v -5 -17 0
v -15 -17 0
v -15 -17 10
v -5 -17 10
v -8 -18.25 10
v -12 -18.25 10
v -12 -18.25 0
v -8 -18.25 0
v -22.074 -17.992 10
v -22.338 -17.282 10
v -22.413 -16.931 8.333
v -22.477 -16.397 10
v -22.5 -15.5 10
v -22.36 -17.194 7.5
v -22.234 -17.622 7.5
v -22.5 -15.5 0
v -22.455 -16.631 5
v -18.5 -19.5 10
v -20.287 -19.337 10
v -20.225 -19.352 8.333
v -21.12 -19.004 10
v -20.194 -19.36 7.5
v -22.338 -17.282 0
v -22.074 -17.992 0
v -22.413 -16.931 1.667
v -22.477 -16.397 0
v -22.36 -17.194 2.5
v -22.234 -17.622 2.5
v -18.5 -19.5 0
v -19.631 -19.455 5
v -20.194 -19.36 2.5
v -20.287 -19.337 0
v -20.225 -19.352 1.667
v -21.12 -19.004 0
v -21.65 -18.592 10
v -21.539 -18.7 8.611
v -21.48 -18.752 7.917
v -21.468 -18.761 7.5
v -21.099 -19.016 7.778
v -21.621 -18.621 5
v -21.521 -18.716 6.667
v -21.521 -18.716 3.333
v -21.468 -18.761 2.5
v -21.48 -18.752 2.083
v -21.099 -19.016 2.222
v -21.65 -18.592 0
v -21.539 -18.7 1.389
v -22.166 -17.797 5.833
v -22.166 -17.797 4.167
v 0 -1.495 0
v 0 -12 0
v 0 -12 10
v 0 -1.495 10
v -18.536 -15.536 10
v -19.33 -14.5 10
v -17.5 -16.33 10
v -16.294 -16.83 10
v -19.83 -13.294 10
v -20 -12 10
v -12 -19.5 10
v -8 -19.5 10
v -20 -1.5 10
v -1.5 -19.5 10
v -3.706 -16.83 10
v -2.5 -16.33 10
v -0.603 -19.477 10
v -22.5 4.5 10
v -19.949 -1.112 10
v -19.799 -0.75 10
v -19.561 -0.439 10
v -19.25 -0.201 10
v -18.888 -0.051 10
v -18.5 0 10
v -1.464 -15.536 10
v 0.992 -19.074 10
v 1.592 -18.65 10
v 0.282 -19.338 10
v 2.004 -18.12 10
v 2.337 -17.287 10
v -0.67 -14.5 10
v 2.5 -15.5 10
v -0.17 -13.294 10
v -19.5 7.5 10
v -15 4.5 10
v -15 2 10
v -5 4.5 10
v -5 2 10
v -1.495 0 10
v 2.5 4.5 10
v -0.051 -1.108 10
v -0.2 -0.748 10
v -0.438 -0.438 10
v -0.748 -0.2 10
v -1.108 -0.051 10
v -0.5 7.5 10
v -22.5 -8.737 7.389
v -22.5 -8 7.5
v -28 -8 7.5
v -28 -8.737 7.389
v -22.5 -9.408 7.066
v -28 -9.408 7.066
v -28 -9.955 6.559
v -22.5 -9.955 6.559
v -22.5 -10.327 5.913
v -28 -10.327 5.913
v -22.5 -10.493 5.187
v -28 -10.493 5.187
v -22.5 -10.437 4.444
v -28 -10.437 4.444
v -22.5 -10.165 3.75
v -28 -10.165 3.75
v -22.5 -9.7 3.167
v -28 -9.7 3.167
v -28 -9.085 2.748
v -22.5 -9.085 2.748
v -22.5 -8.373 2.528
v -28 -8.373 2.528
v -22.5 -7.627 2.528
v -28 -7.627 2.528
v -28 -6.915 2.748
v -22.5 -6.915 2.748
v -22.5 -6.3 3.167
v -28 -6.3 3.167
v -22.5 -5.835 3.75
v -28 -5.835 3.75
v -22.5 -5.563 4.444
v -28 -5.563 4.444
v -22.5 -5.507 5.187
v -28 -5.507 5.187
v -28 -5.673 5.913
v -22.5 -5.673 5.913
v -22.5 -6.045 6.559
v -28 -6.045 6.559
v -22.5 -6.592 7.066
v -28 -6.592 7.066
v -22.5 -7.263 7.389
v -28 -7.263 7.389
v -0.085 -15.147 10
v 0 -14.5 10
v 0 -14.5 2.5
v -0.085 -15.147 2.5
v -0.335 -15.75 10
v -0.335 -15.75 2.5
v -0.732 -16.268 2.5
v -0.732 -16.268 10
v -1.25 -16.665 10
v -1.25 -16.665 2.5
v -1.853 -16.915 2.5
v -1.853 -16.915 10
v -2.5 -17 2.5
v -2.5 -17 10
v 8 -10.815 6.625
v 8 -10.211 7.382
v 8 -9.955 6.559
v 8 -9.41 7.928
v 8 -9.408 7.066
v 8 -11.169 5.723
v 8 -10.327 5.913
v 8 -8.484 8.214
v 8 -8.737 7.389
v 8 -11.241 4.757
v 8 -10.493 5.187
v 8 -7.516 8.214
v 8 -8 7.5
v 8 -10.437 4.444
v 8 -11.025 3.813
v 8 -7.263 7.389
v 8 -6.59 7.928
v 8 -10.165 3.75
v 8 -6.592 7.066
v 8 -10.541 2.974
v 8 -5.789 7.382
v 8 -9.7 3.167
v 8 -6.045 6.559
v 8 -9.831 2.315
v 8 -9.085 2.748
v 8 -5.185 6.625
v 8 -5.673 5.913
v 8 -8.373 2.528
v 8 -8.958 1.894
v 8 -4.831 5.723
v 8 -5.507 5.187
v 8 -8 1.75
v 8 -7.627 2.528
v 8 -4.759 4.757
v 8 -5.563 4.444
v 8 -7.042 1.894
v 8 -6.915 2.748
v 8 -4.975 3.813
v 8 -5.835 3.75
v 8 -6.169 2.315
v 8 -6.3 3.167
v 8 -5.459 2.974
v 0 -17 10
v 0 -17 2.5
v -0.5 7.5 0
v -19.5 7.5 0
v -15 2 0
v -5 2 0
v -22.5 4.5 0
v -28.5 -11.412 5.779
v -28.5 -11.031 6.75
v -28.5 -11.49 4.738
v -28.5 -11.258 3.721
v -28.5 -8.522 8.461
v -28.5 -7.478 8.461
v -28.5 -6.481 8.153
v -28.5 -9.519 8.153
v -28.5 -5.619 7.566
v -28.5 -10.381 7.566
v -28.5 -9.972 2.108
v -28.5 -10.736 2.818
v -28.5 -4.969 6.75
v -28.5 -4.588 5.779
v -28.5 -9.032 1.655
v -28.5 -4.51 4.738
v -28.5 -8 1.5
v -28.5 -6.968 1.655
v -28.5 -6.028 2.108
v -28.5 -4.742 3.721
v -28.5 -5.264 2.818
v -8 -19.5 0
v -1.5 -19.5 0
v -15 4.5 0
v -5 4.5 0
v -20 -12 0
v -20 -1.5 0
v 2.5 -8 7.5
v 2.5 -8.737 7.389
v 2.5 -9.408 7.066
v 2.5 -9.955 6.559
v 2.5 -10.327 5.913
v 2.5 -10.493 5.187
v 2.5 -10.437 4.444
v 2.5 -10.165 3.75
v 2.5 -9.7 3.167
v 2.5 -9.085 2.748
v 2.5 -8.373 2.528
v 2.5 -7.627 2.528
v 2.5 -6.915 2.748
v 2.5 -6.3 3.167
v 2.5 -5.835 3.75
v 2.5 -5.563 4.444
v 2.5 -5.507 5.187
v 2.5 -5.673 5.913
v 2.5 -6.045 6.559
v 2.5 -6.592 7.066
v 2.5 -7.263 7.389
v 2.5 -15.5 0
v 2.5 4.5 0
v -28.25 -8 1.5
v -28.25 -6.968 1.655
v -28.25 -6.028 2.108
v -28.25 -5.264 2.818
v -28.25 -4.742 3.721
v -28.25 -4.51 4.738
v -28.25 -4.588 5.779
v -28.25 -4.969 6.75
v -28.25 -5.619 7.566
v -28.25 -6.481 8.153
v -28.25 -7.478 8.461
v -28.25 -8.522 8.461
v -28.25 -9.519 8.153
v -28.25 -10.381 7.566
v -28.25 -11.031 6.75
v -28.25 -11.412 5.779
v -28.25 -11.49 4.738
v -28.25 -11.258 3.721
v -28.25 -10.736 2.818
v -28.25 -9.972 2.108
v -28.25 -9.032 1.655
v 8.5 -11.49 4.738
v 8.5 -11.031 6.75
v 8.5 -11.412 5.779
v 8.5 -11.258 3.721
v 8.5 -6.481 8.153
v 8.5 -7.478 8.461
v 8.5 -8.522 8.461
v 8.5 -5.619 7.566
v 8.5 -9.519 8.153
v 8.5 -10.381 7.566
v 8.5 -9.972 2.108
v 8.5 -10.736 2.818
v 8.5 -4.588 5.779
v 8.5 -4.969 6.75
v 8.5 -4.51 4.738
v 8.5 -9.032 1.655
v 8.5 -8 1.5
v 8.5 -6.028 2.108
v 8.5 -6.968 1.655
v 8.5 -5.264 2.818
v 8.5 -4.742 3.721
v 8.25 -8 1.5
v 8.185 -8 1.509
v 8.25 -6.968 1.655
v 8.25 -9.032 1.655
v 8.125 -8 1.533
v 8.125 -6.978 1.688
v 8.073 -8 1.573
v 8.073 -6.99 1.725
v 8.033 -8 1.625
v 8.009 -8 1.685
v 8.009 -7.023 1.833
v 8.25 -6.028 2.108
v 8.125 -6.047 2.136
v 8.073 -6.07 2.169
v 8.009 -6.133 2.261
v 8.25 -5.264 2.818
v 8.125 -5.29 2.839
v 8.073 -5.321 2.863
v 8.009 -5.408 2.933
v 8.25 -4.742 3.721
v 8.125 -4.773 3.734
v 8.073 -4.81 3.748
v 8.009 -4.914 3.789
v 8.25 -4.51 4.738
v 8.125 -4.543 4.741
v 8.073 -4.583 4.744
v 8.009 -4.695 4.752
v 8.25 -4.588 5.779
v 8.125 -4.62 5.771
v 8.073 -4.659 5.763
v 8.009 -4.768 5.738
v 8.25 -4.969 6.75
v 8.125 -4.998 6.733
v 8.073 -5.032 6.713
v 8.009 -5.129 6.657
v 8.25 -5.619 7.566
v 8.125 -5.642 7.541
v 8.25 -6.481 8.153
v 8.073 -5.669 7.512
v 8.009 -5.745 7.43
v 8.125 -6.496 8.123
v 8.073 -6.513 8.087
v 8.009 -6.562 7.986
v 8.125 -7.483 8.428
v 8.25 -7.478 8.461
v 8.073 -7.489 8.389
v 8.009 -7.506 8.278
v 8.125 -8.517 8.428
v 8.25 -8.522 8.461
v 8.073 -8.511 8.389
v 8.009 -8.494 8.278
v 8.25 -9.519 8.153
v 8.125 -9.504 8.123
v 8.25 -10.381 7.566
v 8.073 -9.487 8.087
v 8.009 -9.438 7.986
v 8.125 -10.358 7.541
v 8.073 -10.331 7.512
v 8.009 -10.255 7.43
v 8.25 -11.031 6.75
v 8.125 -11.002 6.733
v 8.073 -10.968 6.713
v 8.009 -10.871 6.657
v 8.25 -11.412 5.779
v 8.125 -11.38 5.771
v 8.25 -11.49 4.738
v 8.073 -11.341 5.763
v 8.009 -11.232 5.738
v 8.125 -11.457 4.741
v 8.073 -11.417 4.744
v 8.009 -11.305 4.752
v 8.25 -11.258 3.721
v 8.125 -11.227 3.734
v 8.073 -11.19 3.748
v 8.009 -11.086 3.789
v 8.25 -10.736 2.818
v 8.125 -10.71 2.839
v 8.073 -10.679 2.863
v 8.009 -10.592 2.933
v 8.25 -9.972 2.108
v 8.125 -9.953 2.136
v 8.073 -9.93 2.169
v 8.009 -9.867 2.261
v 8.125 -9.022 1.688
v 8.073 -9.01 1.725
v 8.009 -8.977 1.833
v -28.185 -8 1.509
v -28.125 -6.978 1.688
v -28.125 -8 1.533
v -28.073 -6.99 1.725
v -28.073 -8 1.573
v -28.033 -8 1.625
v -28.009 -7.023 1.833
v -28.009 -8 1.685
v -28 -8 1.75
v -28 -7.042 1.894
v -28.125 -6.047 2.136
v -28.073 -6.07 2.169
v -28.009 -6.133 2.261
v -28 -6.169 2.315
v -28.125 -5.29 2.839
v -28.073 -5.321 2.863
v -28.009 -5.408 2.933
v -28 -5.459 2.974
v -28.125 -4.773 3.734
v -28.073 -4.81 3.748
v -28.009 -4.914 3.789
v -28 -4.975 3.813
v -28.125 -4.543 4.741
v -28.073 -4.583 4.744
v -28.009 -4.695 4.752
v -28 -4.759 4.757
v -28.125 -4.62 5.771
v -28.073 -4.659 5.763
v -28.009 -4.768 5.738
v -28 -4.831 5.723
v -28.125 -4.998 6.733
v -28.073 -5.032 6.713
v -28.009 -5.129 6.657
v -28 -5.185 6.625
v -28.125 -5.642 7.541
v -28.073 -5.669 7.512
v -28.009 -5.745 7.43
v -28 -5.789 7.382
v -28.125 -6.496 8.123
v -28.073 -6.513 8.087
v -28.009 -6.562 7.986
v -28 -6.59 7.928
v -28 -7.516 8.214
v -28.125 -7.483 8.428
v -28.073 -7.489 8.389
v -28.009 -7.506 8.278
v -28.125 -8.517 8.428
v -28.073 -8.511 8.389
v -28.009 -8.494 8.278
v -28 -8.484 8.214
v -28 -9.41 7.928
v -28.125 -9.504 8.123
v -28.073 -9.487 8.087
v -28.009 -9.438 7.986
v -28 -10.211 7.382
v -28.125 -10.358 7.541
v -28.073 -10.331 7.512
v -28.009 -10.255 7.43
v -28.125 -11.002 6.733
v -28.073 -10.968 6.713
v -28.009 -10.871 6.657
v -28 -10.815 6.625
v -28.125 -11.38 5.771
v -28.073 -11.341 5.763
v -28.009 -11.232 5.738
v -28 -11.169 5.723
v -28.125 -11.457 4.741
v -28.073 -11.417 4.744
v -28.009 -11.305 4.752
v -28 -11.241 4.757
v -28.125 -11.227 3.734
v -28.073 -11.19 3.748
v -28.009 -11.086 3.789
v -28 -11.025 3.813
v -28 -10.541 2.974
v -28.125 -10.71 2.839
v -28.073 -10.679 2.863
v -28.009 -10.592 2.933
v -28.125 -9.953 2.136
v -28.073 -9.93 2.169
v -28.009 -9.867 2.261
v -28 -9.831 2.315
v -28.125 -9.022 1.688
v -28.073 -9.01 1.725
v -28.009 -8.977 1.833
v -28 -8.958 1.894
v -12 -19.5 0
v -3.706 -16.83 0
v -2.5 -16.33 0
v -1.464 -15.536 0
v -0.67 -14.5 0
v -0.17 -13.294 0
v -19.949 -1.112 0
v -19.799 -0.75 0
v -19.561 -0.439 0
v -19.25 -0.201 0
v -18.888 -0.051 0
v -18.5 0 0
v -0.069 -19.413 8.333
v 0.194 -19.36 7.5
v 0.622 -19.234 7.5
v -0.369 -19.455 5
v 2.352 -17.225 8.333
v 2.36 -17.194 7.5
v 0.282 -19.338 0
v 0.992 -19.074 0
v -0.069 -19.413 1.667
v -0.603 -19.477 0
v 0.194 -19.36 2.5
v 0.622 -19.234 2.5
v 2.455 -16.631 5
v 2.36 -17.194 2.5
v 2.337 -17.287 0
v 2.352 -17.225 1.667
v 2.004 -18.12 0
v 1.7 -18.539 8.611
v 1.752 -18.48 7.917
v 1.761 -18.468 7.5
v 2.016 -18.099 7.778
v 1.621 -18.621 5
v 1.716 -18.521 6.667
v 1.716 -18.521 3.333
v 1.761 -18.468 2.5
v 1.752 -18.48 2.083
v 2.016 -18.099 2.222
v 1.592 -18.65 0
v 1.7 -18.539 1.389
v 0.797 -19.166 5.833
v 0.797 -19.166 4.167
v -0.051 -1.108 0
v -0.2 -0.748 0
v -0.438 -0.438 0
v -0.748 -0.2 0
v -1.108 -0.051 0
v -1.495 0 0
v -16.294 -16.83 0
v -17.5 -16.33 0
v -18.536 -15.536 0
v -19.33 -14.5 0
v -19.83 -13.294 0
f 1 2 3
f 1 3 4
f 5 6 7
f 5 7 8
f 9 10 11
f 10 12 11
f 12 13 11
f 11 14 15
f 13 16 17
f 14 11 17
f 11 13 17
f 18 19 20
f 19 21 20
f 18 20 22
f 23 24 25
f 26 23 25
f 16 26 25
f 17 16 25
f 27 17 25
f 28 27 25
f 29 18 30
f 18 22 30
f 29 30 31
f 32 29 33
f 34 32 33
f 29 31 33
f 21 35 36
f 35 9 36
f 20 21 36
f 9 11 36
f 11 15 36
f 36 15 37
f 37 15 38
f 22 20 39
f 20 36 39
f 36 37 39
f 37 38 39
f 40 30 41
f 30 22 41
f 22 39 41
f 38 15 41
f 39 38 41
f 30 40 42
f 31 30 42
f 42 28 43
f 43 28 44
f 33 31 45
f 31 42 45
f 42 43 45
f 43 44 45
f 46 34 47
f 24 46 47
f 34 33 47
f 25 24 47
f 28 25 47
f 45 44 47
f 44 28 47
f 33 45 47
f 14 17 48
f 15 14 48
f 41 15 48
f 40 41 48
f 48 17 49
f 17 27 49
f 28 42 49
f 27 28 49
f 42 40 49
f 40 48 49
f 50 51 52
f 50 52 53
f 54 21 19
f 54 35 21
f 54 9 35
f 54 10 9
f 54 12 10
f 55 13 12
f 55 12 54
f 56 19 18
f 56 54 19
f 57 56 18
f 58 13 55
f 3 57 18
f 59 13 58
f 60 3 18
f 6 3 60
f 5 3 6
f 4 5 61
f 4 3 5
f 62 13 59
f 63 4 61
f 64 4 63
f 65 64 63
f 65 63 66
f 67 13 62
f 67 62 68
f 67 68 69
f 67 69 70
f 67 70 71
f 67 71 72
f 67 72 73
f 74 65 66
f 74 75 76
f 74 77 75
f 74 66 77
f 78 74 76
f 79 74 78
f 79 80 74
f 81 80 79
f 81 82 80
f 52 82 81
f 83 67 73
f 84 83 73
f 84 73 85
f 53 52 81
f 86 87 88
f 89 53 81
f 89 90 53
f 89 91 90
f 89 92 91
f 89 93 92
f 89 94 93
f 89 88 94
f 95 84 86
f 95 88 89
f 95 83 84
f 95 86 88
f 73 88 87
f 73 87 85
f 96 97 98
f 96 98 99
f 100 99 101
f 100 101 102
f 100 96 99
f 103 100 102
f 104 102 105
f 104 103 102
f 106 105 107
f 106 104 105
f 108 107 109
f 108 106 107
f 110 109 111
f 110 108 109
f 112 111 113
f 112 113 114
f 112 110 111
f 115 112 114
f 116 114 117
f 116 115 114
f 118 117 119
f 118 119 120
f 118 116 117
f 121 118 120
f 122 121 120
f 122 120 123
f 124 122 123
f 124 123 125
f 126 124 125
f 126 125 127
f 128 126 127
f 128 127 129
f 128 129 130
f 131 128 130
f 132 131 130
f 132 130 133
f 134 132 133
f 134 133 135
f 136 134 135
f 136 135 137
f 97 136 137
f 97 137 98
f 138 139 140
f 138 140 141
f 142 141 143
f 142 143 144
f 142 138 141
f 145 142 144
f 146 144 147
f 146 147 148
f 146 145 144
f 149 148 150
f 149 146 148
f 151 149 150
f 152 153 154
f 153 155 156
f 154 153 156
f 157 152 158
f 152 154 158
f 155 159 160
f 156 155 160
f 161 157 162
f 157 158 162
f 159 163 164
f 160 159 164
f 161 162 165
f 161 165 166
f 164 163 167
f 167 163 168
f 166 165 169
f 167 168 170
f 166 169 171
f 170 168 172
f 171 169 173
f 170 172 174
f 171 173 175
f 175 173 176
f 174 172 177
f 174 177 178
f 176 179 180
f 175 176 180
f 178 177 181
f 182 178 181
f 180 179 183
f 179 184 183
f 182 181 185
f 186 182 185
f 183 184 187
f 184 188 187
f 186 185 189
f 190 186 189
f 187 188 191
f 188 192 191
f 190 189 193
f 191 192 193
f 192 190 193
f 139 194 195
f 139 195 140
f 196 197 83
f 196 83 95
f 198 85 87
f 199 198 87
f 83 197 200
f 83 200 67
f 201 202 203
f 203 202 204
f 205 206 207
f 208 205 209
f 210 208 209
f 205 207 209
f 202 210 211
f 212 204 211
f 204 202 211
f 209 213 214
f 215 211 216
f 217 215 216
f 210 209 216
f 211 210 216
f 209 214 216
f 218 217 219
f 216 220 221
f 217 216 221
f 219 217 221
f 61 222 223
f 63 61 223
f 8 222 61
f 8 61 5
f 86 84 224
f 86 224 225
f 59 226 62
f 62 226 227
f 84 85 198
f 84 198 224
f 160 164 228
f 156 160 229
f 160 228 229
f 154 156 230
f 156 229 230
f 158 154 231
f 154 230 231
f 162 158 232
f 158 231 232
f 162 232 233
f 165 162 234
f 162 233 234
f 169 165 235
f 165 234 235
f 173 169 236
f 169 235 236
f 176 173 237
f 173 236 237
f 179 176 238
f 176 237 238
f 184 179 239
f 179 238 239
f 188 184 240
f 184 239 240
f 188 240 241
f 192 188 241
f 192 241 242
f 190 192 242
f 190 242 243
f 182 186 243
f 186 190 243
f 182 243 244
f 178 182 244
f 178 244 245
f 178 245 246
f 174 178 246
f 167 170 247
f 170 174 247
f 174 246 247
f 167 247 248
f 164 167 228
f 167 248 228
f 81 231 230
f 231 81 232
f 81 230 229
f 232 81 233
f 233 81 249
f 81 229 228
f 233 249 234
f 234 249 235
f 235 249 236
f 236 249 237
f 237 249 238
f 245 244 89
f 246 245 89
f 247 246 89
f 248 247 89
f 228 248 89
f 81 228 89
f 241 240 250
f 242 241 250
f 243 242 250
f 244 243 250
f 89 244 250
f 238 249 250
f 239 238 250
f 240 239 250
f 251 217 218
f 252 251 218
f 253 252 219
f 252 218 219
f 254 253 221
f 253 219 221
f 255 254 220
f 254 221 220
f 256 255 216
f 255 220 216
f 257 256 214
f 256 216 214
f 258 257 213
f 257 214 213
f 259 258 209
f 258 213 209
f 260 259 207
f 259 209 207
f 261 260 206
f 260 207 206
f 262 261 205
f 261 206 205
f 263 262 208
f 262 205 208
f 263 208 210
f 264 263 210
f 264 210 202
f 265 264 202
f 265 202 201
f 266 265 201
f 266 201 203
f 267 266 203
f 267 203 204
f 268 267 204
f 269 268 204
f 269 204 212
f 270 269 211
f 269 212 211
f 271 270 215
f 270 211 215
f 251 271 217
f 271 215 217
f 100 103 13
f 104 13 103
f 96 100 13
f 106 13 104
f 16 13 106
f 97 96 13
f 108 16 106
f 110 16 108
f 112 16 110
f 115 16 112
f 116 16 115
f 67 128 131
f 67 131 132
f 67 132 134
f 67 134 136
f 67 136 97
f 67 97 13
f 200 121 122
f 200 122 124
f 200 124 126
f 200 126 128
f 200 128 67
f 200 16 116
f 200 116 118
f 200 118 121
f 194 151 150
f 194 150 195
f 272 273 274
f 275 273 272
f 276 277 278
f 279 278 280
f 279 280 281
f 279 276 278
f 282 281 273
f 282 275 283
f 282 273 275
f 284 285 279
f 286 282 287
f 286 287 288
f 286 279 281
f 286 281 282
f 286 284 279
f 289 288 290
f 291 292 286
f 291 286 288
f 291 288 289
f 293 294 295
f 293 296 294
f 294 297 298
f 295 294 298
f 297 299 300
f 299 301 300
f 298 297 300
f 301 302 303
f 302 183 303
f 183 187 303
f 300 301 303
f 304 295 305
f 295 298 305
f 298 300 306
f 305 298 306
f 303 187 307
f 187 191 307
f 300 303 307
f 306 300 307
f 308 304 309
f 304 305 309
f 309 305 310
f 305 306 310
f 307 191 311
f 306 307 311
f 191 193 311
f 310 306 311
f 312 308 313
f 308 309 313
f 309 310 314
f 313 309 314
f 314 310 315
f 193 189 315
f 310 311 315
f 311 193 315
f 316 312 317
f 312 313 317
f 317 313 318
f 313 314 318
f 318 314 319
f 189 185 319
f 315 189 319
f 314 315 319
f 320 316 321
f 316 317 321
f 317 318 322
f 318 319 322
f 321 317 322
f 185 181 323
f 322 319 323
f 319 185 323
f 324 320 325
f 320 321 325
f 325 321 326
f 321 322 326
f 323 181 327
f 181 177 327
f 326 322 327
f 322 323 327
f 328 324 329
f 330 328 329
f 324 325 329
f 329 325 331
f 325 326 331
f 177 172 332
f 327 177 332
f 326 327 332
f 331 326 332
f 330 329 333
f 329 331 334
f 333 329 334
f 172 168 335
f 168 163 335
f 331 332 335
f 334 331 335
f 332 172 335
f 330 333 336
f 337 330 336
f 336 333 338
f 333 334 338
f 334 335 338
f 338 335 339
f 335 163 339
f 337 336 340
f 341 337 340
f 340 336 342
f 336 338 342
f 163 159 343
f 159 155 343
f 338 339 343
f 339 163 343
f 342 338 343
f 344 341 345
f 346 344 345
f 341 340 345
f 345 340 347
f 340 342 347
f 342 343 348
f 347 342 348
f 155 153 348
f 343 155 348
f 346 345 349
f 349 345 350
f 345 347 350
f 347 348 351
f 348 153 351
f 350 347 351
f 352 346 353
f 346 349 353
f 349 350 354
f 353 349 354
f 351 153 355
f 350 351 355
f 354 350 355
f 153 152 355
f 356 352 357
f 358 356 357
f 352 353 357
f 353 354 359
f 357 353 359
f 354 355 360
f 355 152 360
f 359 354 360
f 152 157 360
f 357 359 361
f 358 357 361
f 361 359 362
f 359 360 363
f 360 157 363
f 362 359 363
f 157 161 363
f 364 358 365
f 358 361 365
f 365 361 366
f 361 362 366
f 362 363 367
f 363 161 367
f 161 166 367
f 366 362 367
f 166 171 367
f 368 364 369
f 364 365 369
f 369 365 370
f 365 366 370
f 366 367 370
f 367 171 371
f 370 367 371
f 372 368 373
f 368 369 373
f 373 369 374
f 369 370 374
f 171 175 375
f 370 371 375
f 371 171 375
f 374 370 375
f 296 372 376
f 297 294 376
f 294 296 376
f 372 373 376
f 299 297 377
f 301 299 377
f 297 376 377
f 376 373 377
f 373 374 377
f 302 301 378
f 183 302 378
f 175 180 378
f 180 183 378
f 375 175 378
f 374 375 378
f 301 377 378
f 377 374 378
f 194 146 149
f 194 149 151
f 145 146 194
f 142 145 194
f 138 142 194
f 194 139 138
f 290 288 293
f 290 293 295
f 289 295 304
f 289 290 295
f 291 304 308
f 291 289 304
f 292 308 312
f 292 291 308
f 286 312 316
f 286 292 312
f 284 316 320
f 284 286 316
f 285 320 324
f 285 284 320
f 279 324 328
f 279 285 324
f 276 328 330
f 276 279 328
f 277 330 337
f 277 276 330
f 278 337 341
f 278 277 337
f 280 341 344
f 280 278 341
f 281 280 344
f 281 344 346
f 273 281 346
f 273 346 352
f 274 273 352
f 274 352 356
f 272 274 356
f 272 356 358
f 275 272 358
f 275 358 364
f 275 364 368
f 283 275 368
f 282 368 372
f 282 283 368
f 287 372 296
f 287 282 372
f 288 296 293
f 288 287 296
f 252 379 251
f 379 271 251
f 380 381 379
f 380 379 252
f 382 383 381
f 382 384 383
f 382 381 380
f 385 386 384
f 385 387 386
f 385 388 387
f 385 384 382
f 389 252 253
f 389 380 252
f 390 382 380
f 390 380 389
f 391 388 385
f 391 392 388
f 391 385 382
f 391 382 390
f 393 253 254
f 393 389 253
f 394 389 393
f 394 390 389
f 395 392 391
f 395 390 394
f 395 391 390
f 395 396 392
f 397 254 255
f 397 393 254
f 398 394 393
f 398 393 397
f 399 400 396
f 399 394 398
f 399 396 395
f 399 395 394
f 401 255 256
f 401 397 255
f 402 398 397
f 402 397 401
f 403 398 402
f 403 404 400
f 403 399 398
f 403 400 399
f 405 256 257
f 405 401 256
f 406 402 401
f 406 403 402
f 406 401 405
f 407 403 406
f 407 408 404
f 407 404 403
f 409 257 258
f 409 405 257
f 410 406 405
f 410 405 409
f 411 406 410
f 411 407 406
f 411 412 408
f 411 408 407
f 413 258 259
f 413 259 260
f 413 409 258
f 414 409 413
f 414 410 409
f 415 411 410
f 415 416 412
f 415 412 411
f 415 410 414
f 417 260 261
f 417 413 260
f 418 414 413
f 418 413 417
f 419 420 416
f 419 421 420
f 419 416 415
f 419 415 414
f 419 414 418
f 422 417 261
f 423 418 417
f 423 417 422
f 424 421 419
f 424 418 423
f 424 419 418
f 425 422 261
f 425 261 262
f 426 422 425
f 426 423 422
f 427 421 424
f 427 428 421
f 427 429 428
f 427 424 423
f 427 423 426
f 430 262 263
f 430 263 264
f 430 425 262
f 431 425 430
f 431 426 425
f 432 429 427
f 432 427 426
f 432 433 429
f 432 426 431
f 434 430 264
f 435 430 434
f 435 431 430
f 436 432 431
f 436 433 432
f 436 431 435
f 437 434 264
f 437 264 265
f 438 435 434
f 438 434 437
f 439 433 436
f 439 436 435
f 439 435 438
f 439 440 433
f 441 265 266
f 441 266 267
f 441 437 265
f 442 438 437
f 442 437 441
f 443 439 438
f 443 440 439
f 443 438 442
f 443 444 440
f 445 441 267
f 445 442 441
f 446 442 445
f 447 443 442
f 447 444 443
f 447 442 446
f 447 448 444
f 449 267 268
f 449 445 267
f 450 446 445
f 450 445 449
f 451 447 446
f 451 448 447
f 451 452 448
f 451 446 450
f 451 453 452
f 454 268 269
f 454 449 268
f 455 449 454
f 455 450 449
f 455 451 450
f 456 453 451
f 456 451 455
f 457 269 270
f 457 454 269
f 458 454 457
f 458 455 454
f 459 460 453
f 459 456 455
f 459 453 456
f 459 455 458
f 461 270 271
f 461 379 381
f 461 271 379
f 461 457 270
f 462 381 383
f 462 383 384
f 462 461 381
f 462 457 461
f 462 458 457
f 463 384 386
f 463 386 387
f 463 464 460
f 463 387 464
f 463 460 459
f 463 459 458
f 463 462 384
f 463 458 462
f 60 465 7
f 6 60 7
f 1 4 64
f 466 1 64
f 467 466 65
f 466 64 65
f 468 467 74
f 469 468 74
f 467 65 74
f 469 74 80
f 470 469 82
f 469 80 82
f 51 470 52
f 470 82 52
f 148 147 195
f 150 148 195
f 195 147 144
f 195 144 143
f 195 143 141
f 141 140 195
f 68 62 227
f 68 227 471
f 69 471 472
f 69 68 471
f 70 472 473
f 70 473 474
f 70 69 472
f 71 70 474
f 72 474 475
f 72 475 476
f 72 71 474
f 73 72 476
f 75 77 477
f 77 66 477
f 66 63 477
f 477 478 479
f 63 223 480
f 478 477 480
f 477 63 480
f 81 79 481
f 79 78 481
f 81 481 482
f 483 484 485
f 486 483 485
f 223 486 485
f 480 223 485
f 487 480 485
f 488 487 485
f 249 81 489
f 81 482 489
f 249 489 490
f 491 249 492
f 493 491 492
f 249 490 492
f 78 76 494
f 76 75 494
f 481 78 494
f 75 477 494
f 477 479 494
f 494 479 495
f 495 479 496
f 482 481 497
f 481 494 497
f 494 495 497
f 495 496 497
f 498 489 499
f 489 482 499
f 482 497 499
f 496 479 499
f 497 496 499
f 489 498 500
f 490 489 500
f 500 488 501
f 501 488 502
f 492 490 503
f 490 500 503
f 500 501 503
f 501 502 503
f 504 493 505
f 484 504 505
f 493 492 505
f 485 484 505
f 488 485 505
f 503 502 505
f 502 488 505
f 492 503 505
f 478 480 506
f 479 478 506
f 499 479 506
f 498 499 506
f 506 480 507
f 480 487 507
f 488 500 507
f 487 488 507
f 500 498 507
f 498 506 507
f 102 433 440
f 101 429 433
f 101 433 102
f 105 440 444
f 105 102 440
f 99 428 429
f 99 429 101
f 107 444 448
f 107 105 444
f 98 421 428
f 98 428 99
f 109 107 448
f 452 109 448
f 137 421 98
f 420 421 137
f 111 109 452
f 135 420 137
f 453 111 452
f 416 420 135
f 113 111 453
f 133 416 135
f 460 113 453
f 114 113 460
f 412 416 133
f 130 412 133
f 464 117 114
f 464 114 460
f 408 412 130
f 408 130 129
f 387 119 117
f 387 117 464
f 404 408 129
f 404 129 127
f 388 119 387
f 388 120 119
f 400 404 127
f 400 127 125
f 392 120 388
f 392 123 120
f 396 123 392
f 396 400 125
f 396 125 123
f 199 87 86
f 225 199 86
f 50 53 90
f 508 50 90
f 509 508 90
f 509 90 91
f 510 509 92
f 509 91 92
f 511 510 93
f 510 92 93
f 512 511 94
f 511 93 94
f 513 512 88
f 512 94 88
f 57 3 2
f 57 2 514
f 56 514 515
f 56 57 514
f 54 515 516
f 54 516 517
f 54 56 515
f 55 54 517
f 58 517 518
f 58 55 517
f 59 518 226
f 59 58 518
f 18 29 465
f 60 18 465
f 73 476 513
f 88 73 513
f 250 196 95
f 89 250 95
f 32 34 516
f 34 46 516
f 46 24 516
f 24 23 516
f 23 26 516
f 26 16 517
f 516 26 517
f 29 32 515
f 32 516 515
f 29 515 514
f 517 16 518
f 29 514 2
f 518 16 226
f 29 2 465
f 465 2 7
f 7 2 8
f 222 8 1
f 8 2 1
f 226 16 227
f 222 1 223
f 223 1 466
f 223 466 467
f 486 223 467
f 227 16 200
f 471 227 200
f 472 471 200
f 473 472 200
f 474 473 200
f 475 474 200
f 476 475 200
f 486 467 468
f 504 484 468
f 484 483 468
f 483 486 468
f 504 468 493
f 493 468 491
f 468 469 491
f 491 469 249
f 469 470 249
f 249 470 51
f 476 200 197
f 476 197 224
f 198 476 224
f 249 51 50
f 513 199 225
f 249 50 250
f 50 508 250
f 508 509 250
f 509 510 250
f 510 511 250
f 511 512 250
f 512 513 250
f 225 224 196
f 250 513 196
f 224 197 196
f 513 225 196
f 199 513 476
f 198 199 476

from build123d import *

# Parameters (mm, degrees)
SKETCH1_W            = 25
SKETCH1_H            = 27
SKETCH1_W_2          = 20
SKETCH1_H_2          = 17
BOSS_EXTRUDE1_DEPTH  = 10
FILLET1_SIZE         = 4
BOSS_EXTRUDE2_DEPTH  = 10
BOSS_EXTRUDE3_DEPTH  = 10
BOSS_EXTRUDE4_DEPTH  = 7.5
BOSS_EXTRUDE5_DEPTH  = 10
CHAMFER1_SIZE        = 3
SKETCH8_W            = 10
SKETCH8_H            = 2.5
CUT_EXTRUDE1_DEPTH   = 10.5
SKETCH19_W           = 4
SKETCH19_H           = 1.25
CUT_EXTRUDE5_DEPTH   = 32.408597715
SKETCH20_R           = 2.5
BOSS_EXTRUDE10_DEPTH = 6
SKETCH21_R           = 3.5
BOSS_EXTRUDE11_DEPTH = 0.5
FILLET2_R            = 0.25
FILLET3_R            = 0.25


with BuildPart() as part:
    # Sketch1 → Boss-Extrude1 (new body)
    with BuildSketch(Plane.XY):
        with Locations((-10, -6)):
            Rectangle(SKETCH1_W, SKETCH1_H)
        with Locations((-10, -8.5)):
            Rectangle(SKETCH1_W_2, SKETCH1_H_2, mode=Mode.SUBTRACT)
    extrude(amount=BOSS_EXTRUDE1_DEPTH)

    # Fillet1
    # a fillet whose section is not a circle: 4 mm, written as the material it takes off along each edge
    with BuildSketch(Plane(origin=(-22.5, -19.5, -10), x_dir=(0, 1, 0), z_dir=(0, 0, 1)), Plane(origin=(2.5, -19.5, -10), x_dir=(-1, 0, 0), z_dir=(0, 0, 1))) as fillet1_piece_1:
        with BuildLine():
            add(Edge.make_bspline([(FILLET1_SIZE, 0), (FILLET1_SIZE * 0.831801948466, 0), (FILLET1_SIZE * 0.663603896932, 0), (FILLET1_SIZE * 0.292893218813, -FILLET1_SIZE * 0.0716919198361), (FILLET1_SIZE * 0.0716919198361, -FILLET1_SIZE * 0.292893218813), (0, -FILLET1_SIZE * 0.663603896932), (0, -FILLET1_SIZE * 0.831801948466), (0, -FILLET1_SIZE)], knots=[0, 0, 0, 0, 0, 0, 0.5, 0.5, 1, 1, 1, 1, 1, 1], degree=5))
            Line((0, -FILLET1_SIZE), (0, 0))
            Line((0, 0), (FILLET1_SIZE, 0))
        make_face()
    extrude(amount=30, mode=Mode.SUBTRACT)

    # Sketch3 → Boss-Extrude2 (add)
    with BuildSketch(Plane.XY.offset(10)):
        with BuildLine():
            Line((-18.5, 0), (-20, 0))
            Line((-20, 0), (-20, -1.5))
            ThreePointArc((-20, -1.5), (-19.560660172, -0.439339828), (-18.5, 0))
        make_face()
    extrude(amount=-BOSS_EXTRUDE2_DEPTH)

    # Sketch4 → Boss-Extrude3 (add)
    with BuildSketch(Plane.XY.offset(10)):
        with BuildLine():
            Line((0, 0), (0, -1.495394009))
            ThreePointArc((0, -1.495394009), (-0.437990765, -0.437990765), (-1.495394009, 0))
            Line((-1.495394009, 0), (0, 0))
        make_face()
    extrude(amount=-BOSS_EXTRUDE3_DEPTH)

    # Sketch7 → Boss-Extrude5 (add)
    with BuildSketch(Plane.XY.offset(10)):
        with BuildLine():
            Line((-20, -17), (-15, -17))
            ThreePointArc((-15, -17), (-18.535533906, -15.535533906), (-20, -12))
            Line((-20, -12), (-20, -17))
        make_face()
        with BuildLine():
            Line((0, -17), (-5, -17))
            ThreePointArc((-5, -17), (-1.464466094, -15.535533906), (0, -12))
            Line((0, -12), (0, -17))
        make_face()
    extrude(amount=-BOSS_EXTRUDE5_DEPTH)

    # Chamfer1
    chamfer1_edges = [part.edges().sort_by_distance(p)[0] for p in [
        (2.5, 7.5, 5),
        (-22.5, 7.5, 5),
    ]]
    chamfer(chamfer1_edges, length=CHAMFER1_SIZE)

    # Sketch8 → Cut-Extrude1 (cut)
    with BuildSketch(Plane.XY.offset(10)):
        with Locations((-10, 3.25)):
            Rectangle(SKETCH8_W, SKETCH8_H)
    extrude(amount=-CUT_EXTRUDE1_DEPTH, mode=Mode.SUBTRACT)

    # Sketch19 → Cut-Extrude5 (cut, through all)
    with BuildSketch(Plane.XY.offset(10)):
        with Locations((-10, -18.875)):
            Rectangle(SKETCH19_W, SKETCH19_H)
    extrude(amount=-CUT_EXTRUDE5_DEPTH, mode=Mode.SUBTRACT)

    # Sketch20 → Boss-Extrude10 (add)
    with BuildSketch(Plane(origin=(2.5, 0, 0), x_dir=(0, 0, -1), z_dir=(1, 0, 0))):
        with Locations(Location((-5, -8, 0), (0, 0, 180))):
            Circle(SKETCH20_R)
    boss_extrude10 = extrude(amount=BOSS_EXTRUDE10_DEPTH)

    # Sketch21 → Boss-Extrude11 (add)
    with BuildSketch(Plane(origin=(8.5, 0, 0), x_dir=(0, 0, -1), z_dir=(1, 0, 0))):
        with Locations((-5, -8)):
            Circle(SKETCH21_R)
    boss_extrude11 = extrude(amount=-BOSS_EXTRUDE11_DEPTH)

    # Fillet2
    fillet2_edges = [part.edges().sort_by_distance(p)[0] for p in [
        (8, -8, 8.5),
    ]]
    fillet(fillet2_edges, radius=FILLET2_R)

    # Mirror1: Boss-Extrude10, Boss-Extrude11 across plane
    add(boss_extrude10.mirror(Plane.ZY.offset(10)))
    add(boss_extrude11.mirror(Plane.ZY.offset(10)))

    # Fillet3
    fillet3_edges = [part.edges().sort_by_distance(p)[0] for p in [
        (-28, -8, 8.5),
    ]]
    fillet(fillet3_edges, radius=FILLET3_R)


with BuildPart() as body_2:
    # Sketch6 → Boss-Extrude4 (new body)
    with BuildSketch(Plane.XY.offset(10)):
        with BuildLine():
            Line((0, -17), (0, -14.5))
            ThreePointArc((0, -14.5), (-0.732233047, -16.267766953), (-2.5, -17))
            Line((-2.5, -17), (0, -17))
        make_face()
    extrude(amount=-BOSS_EXTRUDE4_DEPTH)


solid = Compound([part.part, body_2.part])
